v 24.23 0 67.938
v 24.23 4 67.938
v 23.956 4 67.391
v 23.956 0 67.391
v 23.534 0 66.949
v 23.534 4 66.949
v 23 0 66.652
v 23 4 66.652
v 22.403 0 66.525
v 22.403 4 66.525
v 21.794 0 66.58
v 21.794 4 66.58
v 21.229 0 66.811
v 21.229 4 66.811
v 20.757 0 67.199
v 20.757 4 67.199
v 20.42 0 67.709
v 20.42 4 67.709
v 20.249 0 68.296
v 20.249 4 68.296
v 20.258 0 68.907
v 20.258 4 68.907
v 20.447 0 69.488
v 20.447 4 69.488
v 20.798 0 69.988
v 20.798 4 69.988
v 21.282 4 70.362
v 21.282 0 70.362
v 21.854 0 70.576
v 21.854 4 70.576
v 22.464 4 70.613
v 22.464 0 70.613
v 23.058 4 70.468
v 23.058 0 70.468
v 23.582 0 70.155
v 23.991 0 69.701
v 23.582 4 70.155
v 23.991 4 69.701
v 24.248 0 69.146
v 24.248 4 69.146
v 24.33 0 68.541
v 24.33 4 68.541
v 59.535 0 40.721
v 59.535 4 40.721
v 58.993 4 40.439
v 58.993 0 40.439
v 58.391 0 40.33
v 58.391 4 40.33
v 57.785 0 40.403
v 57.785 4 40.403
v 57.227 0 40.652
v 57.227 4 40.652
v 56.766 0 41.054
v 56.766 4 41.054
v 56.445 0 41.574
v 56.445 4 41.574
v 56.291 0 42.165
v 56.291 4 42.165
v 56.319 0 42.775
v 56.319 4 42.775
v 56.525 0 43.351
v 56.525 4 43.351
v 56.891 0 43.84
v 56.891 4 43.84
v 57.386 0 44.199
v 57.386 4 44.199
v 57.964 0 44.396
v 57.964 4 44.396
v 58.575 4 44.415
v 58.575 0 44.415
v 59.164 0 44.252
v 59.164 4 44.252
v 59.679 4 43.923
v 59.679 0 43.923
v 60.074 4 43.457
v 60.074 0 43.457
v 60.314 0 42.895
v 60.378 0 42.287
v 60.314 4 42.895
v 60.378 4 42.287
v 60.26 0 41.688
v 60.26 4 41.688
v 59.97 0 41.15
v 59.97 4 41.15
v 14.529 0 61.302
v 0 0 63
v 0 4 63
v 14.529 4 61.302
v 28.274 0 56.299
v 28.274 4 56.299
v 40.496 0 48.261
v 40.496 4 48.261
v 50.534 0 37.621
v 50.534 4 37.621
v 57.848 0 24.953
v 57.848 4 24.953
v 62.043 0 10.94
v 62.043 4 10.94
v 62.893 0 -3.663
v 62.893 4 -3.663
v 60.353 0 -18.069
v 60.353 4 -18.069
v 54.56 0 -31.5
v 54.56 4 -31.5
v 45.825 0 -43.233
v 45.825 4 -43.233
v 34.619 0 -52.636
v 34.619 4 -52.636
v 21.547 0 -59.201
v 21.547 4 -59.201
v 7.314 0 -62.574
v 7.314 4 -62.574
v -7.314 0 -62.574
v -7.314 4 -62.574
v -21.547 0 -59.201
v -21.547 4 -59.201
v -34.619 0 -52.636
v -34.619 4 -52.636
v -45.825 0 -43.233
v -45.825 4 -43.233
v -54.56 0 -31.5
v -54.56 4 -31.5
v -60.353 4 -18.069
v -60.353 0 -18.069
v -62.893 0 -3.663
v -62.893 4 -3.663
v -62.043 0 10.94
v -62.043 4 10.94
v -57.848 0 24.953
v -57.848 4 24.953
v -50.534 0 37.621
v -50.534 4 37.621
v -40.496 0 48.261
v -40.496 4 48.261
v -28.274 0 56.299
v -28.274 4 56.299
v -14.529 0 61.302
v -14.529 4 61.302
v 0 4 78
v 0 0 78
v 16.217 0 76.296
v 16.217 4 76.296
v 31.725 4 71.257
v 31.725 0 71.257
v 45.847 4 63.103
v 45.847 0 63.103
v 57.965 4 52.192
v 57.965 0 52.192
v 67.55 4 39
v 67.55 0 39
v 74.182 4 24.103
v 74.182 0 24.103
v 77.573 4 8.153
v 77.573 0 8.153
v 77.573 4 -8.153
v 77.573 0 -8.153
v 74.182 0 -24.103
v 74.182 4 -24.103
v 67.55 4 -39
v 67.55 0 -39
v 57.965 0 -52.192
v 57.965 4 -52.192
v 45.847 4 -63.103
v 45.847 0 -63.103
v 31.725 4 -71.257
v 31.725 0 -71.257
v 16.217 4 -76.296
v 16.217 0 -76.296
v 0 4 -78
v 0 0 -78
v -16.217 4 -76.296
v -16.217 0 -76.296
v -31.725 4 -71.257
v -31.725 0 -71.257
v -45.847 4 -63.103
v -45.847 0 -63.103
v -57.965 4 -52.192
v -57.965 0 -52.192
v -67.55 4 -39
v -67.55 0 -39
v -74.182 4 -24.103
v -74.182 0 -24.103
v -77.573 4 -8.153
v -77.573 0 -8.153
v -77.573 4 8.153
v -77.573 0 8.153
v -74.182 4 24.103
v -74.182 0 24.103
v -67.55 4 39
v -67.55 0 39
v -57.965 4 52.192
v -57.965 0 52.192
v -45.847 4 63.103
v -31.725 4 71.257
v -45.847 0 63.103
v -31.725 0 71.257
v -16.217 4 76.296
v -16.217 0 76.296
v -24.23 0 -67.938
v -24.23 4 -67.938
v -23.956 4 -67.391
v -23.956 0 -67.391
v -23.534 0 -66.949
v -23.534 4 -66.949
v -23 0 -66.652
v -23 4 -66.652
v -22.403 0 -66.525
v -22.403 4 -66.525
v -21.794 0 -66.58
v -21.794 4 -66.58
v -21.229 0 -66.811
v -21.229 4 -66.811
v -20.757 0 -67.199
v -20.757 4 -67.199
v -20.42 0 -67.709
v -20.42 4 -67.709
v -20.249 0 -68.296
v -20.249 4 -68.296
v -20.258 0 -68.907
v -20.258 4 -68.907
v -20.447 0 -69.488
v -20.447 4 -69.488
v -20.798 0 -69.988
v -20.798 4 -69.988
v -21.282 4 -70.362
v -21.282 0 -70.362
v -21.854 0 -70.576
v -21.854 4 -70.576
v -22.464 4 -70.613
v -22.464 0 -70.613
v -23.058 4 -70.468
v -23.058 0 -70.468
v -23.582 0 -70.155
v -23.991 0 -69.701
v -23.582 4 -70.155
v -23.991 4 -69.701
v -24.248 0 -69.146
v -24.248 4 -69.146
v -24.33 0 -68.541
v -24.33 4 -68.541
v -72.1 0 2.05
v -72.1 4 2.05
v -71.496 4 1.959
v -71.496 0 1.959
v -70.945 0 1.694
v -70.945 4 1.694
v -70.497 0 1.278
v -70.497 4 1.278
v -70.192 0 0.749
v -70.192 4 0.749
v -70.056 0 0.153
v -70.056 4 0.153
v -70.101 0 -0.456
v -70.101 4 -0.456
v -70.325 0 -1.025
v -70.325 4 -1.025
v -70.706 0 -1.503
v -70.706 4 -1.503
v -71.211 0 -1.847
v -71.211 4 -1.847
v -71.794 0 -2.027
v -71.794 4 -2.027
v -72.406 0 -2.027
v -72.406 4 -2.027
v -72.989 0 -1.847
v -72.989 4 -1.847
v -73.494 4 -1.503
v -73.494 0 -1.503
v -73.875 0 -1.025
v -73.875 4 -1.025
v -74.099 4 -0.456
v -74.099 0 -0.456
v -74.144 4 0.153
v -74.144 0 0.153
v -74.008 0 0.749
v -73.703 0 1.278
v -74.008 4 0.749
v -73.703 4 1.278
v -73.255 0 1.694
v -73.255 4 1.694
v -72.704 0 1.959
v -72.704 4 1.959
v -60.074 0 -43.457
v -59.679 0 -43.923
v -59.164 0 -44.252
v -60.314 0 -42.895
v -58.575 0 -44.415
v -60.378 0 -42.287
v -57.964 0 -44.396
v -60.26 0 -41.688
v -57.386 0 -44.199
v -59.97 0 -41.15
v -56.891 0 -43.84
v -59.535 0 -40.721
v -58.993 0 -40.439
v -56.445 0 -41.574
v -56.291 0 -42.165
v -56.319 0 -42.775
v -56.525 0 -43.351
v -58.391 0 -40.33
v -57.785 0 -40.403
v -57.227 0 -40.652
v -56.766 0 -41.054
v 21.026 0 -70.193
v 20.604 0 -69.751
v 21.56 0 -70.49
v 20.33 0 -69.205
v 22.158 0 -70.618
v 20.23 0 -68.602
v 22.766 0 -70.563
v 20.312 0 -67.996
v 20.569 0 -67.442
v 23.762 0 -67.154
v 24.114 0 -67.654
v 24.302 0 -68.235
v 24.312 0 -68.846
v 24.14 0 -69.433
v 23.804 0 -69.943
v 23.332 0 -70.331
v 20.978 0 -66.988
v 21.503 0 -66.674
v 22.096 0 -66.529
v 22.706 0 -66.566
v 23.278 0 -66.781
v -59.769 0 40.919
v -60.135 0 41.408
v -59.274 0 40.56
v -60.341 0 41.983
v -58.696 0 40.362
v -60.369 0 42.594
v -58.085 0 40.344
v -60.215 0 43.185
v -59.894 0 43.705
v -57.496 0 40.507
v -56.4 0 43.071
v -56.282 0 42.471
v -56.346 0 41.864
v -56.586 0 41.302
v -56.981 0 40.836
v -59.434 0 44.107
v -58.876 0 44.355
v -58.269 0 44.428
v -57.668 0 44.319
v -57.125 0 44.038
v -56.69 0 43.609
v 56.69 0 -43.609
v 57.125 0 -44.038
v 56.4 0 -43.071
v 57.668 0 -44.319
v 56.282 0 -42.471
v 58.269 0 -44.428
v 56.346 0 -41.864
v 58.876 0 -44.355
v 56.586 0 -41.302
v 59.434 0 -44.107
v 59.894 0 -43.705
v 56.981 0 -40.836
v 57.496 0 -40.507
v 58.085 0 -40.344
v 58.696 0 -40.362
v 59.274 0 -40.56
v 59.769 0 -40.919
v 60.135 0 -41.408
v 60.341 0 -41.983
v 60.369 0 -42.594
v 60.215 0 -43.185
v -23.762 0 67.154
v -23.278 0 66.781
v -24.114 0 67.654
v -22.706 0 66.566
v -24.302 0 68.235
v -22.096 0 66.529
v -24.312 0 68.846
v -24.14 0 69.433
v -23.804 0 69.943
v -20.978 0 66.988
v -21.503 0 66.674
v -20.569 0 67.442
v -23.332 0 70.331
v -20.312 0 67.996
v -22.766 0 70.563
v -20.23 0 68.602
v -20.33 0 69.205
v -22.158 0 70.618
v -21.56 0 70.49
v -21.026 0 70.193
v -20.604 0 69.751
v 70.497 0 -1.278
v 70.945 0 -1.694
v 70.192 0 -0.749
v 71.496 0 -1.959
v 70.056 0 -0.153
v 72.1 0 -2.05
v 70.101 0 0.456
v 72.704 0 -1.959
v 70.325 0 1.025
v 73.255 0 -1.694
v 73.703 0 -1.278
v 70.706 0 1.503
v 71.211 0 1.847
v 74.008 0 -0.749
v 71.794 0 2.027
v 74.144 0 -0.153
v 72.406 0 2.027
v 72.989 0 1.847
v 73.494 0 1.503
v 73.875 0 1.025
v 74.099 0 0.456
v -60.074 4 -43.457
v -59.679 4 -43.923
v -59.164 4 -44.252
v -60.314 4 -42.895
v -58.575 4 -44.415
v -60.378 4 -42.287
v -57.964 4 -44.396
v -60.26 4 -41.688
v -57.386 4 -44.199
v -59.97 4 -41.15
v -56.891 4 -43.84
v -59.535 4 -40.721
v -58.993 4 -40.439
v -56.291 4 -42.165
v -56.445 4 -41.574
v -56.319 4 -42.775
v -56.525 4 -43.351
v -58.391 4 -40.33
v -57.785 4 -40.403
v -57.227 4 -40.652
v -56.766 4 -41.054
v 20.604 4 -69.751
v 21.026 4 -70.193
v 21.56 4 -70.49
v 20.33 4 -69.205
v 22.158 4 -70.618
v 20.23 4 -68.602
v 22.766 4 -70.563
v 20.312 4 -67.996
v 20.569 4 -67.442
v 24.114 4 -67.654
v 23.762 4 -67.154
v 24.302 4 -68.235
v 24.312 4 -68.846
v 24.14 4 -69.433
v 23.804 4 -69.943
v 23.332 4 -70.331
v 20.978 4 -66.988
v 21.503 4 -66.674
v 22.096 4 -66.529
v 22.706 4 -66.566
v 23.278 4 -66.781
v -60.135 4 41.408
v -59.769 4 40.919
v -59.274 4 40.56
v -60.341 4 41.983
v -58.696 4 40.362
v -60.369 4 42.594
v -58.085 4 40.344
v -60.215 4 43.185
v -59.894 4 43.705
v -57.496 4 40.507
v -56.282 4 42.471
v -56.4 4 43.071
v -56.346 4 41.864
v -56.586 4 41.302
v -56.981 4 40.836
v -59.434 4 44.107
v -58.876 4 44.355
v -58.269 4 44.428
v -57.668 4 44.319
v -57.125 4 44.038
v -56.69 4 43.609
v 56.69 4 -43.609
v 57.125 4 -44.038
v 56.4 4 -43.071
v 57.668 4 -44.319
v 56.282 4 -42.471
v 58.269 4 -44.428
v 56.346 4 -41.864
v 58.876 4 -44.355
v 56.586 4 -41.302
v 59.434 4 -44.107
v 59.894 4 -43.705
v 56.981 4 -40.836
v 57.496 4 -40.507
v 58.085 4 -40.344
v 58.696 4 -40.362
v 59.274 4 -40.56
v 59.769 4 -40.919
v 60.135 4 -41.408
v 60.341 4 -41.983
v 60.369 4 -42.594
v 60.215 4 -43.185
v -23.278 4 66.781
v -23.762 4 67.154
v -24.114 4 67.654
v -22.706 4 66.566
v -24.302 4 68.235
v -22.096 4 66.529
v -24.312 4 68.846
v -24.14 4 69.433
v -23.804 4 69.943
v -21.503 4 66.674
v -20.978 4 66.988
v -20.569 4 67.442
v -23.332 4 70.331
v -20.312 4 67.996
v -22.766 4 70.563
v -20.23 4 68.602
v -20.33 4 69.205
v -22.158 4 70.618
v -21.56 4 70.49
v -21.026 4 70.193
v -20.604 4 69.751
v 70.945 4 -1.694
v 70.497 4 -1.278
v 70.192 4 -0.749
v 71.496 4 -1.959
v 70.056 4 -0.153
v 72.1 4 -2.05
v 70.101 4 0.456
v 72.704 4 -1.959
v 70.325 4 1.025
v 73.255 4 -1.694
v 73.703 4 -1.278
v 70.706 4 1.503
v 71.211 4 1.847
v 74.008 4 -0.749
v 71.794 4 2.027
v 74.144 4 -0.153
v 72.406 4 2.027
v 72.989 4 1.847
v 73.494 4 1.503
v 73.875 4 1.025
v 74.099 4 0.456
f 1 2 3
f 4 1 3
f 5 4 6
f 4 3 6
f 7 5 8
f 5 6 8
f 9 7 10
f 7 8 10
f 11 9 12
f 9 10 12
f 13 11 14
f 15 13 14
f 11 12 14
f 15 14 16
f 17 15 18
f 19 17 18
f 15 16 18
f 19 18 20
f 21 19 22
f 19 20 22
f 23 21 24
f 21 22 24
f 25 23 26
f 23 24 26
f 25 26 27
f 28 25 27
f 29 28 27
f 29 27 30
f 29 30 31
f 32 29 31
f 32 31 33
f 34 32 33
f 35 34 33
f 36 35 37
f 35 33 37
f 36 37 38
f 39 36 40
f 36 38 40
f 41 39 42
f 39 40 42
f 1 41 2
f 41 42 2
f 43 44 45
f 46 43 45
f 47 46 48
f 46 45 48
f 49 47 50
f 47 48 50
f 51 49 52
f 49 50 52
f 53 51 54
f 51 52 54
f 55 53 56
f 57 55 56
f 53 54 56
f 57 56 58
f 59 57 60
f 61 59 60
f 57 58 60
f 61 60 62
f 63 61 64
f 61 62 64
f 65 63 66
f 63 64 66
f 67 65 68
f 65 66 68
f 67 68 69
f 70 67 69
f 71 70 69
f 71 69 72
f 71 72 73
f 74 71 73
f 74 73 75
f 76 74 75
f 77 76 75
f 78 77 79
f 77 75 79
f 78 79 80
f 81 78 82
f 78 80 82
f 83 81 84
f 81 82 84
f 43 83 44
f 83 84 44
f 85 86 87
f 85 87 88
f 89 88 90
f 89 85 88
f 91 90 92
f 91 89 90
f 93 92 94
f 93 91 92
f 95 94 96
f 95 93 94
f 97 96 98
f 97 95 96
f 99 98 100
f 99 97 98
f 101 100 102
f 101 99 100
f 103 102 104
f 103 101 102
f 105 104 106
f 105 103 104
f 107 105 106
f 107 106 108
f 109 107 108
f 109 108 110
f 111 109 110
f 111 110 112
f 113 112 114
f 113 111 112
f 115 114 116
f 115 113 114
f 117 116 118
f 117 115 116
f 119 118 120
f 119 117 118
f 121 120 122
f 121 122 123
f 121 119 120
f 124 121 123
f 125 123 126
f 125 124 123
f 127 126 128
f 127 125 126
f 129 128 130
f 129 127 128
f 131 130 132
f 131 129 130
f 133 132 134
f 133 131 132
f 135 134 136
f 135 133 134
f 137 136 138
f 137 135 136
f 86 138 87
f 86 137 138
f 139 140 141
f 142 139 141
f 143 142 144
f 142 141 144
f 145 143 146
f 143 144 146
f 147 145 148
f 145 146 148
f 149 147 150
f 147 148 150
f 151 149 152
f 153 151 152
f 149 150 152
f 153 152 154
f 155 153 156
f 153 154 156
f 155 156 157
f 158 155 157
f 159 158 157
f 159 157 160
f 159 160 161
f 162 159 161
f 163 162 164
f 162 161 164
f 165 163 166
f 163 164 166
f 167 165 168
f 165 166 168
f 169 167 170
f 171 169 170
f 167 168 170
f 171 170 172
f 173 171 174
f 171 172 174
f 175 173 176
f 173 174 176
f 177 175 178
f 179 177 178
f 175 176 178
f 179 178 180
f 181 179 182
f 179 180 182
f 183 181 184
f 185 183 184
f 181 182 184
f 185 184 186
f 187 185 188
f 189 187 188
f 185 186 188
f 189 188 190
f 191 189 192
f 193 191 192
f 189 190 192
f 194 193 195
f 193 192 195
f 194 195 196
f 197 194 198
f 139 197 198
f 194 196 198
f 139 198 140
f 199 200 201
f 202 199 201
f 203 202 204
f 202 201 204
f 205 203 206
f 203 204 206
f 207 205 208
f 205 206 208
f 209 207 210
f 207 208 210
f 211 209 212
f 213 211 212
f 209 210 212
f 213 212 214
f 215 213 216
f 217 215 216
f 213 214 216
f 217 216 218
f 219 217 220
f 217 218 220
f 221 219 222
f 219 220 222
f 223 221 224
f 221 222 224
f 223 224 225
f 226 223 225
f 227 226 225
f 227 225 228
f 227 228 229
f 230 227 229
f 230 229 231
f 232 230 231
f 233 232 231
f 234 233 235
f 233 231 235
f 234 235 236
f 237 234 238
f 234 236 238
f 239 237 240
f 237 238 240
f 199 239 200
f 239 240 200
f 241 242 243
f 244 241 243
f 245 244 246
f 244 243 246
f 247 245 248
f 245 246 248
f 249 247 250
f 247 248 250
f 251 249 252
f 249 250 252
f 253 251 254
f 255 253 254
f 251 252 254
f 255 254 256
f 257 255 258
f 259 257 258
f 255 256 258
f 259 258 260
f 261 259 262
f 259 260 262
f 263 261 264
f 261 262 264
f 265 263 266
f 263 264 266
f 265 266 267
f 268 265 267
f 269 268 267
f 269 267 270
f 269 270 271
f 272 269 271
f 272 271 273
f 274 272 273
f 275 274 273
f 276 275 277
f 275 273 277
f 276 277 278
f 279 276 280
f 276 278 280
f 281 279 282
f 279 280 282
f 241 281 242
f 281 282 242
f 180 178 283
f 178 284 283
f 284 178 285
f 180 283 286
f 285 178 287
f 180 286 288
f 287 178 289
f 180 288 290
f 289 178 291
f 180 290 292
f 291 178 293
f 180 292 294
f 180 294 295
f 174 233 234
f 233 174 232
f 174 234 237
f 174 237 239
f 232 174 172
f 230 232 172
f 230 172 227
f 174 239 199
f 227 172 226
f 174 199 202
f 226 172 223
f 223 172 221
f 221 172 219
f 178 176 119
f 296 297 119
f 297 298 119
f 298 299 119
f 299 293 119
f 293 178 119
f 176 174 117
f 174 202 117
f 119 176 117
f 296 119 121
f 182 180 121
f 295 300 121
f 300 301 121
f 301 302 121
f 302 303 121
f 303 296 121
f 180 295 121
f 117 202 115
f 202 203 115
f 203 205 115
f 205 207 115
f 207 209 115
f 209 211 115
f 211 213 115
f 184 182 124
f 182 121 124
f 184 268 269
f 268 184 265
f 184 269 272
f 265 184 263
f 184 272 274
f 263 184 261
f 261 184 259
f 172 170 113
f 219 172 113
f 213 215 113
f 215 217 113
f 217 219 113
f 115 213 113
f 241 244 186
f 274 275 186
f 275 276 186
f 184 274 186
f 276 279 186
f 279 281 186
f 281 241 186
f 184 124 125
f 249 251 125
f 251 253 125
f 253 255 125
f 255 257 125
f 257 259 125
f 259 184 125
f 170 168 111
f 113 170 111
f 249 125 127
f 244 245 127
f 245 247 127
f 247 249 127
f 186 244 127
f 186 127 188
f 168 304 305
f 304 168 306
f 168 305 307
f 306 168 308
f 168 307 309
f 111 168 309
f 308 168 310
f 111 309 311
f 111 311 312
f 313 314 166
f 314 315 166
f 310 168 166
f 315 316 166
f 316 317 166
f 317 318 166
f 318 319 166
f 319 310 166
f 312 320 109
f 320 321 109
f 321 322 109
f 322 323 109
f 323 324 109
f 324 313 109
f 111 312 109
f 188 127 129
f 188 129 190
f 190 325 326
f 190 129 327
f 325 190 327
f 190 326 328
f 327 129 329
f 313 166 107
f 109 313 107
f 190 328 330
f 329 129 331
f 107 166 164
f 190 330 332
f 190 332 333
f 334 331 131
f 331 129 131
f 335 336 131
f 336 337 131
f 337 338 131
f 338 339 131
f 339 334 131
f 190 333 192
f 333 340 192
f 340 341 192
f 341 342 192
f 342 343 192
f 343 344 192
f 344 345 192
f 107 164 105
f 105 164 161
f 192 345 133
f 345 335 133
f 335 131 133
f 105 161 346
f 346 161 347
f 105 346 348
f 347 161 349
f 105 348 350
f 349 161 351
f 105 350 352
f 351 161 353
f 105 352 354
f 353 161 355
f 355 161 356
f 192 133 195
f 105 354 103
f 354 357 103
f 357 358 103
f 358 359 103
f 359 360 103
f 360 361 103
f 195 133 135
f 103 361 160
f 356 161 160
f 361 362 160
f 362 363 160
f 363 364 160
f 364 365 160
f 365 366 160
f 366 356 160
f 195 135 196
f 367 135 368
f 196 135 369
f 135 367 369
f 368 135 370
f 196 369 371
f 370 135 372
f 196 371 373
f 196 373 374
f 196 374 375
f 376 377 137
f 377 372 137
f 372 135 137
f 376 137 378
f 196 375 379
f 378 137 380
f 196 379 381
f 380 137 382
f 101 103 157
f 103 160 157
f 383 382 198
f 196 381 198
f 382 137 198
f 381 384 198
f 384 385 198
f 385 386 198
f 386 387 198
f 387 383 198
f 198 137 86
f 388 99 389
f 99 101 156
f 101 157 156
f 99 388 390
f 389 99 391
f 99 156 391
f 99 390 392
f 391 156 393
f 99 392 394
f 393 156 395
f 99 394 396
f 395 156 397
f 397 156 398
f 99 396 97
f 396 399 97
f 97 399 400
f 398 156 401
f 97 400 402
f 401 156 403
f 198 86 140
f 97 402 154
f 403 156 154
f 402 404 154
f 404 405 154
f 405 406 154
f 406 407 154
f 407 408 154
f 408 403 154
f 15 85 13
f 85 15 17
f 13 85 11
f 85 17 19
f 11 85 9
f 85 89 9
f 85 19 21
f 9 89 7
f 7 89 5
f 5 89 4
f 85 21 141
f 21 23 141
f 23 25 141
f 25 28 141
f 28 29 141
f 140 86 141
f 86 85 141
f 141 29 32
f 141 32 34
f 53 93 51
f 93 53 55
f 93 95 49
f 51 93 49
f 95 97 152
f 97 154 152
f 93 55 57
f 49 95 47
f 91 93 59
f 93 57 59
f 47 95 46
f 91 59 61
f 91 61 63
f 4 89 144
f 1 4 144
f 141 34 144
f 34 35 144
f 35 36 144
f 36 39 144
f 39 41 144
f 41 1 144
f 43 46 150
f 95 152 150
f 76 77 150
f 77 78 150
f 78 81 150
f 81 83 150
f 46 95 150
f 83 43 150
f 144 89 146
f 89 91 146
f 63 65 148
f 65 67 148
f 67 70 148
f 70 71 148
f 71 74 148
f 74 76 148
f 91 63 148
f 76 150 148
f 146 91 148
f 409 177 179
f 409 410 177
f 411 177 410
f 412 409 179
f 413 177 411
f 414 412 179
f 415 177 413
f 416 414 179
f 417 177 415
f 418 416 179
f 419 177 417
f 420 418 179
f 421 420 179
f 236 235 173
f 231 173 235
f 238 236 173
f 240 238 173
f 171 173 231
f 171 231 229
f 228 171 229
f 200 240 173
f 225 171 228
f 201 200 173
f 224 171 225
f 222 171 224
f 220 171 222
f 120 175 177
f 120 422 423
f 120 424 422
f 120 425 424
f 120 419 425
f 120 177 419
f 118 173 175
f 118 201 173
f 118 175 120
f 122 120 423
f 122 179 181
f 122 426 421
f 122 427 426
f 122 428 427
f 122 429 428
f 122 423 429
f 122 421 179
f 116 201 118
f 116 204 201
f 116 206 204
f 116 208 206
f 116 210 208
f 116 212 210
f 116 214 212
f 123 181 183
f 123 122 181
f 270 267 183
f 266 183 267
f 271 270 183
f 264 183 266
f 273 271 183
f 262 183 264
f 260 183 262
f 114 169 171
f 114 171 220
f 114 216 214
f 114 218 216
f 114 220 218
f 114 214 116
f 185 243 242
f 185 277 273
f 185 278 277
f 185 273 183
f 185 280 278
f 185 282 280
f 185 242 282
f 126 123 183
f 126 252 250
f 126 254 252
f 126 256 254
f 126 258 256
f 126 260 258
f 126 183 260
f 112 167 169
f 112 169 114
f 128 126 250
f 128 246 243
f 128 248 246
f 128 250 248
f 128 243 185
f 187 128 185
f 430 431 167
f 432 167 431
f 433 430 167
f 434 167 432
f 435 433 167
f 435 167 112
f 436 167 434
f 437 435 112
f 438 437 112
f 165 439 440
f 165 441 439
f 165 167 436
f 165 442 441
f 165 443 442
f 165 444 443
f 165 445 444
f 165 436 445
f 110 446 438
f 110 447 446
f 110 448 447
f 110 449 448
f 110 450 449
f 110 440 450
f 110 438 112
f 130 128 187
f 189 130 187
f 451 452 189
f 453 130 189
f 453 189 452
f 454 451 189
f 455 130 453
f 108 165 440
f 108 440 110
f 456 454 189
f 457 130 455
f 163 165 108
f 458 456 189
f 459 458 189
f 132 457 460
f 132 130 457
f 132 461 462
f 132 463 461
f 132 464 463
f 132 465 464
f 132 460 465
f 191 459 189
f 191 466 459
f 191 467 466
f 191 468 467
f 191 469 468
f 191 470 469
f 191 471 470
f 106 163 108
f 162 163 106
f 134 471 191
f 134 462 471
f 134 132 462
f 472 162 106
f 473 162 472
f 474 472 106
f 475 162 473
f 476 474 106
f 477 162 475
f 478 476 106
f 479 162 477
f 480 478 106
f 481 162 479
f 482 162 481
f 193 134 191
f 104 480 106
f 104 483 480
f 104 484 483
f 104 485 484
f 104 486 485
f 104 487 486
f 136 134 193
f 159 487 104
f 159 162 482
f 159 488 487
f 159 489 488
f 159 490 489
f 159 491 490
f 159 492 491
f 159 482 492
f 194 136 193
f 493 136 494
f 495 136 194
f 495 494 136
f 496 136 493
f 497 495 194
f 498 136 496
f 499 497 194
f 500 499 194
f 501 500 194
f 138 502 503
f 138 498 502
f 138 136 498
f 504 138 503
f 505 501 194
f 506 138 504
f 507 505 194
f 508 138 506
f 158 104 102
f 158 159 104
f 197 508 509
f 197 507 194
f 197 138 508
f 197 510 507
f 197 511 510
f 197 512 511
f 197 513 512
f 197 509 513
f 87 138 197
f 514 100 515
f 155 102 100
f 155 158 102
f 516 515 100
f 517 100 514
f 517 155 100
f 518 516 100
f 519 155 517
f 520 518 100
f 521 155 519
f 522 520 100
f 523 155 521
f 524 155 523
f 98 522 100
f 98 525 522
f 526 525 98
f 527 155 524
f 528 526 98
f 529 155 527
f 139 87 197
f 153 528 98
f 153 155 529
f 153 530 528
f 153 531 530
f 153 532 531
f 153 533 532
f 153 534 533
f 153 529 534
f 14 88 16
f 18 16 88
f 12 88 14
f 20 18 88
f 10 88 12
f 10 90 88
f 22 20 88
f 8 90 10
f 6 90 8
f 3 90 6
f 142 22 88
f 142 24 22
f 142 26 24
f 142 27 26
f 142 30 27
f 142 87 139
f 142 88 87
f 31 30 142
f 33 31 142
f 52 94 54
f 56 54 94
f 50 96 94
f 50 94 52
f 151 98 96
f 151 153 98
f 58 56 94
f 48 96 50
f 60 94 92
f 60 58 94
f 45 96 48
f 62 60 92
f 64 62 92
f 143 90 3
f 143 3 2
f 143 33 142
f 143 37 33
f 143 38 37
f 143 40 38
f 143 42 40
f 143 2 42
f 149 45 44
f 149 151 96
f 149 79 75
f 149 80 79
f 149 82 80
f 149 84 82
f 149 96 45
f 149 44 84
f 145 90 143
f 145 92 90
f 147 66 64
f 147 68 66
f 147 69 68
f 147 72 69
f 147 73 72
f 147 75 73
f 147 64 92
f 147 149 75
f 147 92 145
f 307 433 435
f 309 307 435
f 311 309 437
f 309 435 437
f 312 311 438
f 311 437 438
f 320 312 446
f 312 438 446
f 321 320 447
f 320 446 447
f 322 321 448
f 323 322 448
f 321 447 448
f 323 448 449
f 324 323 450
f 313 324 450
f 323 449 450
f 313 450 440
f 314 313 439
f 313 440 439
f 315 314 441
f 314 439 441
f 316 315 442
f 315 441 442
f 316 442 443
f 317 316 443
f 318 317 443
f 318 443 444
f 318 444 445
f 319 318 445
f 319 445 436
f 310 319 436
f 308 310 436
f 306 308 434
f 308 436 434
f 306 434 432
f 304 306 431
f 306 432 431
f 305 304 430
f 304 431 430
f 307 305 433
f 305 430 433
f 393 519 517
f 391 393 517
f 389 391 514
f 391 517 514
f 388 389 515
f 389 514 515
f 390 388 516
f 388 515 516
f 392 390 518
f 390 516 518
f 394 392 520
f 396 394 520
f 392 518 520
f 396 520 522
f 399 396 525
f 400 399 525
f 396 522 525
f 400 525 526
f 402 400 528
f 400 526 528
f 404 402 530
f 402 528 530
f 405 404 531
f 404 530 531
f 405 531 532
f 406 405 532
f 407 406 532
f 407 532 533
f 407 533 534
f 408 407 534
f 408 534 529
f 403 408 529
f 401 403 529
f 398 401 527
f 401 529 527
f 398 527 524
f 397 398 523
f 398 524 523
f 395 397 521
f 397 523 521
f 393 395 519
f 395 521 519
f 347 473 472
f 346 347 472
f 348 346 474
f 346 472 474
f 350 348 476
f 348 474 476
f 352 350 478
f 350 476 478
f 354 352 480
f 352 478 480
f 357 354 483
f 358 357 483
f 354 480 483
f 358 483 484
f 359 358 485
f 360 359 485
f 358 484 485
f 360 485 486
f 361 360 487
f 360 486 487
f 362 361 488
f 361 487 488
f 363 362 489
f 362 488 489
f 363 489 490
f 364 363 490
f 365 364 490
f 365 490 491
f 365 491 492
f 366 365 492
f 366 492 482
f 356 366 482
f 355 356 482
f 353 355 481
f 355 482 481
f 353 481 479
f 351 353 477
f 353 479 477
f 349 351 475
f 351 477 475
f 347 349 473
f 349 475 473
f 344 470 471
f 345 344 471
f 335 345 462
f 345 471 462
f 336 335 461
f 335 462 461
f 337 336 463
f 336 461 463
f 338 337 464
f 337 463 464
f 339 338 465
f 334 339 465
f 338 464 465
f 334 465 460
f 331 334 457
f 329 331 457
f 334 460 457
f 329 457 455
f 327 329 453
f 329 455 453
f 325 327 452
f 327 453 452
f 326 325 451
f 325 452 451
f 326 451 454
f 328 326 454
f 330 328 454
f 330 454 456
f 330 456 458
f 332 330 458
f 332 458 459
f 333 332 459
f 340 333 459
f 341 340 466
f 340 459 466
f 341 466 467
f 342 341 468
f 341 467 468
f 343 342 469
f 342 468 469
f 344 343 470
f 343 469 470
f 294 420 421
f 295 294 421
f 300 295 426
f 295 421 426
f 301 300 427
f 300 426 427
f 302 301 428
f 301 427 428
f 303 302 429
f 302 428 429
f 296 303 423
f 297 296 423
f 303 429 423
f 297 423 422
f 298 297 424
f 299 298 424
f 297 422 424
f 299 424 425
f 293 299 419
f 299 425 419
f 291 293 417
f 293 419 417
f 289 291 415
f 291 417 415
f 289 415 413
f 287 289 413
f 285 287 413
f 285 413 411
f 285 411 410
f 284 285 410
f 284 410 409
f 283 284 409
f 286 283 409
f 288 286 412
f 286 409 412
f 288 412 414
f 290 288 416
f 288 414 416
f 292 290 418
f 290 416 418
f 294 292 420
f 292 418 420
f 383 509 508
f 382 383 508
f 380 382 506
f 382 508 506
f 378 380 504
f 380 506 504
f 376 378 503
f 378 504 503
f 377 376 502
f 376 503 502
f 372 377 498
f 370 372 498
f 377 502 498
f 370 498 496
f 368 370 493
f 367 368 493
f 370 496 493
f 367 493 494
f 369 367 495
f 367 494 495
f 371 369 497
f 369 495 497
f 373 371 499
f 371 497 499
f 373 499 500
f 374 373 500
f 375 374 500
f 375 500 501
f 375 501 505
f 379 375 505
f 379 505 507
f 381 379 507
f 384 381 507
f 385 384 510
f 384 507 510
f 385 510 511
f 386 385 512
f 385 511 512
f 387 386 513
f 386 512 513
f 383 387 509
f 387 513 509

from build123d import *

# Parameters (mm, degrees)
SKETCH_1_R               = 78
SKETCH_1_R_2             = 63
EXTRUDE_1_DEPTH          = 4
SKETCH_2_R               = 2.05
CUT_EXTRUDE_1_DEPTH      = 4
PATTERN_CIRCULAR_1_COUNT = 10


with BuildPart() as part:
    # 草图1 → 凸台-拉伸1 (new body)
    with BuildSketch(Plane(origin=(0, 0, 0), x_dir=(1, 0, 0), z_dir=(0, 1, 0))):
        with Locations(Location((0, 0, 0), (0, 0, 270))):
            Circle(SKETCH_1_R)
        with Locations(Location((0, 0, 0), (0, 0, 270))):
            Circle(SKETCH_1_R_2, mode=Mode.SUBTRACT)
    extrude(amount=EXTRUDE_1_DEPTH)

    # 草图2 → 切除-拉伸1 (cut)
    with BuildSketch(Plane(origin=(0, 4, 0), x_dir=(1, 0, 0), z_dir=(0, 1, 0))):
        with Locations(Location((-72.1, 0, 0), (0, 0, 270))):
            Circle(SKETCH_2_R)
    cut_extrude_1 = extrude(amount=-CUT_EXTRUDE_1_DEPTH, mode=Mode.SUBTRACT)

    # 阵列(圆周)1: 切除-拉伸1 ×10 about axis
    pattern_circular_1_axis = Axis((0, 0, 0), (0, 1, 0))
    for i in range(1, PATTERN_CIRCULAR_1_COUNT):
        add(cut_extrude_1.rotate(pattern_circular_1_axis, i * 360 / PATTERN_CIRCULAR_1_COUNT), mode=Mode.SUBTRACT)


solid = part.part
